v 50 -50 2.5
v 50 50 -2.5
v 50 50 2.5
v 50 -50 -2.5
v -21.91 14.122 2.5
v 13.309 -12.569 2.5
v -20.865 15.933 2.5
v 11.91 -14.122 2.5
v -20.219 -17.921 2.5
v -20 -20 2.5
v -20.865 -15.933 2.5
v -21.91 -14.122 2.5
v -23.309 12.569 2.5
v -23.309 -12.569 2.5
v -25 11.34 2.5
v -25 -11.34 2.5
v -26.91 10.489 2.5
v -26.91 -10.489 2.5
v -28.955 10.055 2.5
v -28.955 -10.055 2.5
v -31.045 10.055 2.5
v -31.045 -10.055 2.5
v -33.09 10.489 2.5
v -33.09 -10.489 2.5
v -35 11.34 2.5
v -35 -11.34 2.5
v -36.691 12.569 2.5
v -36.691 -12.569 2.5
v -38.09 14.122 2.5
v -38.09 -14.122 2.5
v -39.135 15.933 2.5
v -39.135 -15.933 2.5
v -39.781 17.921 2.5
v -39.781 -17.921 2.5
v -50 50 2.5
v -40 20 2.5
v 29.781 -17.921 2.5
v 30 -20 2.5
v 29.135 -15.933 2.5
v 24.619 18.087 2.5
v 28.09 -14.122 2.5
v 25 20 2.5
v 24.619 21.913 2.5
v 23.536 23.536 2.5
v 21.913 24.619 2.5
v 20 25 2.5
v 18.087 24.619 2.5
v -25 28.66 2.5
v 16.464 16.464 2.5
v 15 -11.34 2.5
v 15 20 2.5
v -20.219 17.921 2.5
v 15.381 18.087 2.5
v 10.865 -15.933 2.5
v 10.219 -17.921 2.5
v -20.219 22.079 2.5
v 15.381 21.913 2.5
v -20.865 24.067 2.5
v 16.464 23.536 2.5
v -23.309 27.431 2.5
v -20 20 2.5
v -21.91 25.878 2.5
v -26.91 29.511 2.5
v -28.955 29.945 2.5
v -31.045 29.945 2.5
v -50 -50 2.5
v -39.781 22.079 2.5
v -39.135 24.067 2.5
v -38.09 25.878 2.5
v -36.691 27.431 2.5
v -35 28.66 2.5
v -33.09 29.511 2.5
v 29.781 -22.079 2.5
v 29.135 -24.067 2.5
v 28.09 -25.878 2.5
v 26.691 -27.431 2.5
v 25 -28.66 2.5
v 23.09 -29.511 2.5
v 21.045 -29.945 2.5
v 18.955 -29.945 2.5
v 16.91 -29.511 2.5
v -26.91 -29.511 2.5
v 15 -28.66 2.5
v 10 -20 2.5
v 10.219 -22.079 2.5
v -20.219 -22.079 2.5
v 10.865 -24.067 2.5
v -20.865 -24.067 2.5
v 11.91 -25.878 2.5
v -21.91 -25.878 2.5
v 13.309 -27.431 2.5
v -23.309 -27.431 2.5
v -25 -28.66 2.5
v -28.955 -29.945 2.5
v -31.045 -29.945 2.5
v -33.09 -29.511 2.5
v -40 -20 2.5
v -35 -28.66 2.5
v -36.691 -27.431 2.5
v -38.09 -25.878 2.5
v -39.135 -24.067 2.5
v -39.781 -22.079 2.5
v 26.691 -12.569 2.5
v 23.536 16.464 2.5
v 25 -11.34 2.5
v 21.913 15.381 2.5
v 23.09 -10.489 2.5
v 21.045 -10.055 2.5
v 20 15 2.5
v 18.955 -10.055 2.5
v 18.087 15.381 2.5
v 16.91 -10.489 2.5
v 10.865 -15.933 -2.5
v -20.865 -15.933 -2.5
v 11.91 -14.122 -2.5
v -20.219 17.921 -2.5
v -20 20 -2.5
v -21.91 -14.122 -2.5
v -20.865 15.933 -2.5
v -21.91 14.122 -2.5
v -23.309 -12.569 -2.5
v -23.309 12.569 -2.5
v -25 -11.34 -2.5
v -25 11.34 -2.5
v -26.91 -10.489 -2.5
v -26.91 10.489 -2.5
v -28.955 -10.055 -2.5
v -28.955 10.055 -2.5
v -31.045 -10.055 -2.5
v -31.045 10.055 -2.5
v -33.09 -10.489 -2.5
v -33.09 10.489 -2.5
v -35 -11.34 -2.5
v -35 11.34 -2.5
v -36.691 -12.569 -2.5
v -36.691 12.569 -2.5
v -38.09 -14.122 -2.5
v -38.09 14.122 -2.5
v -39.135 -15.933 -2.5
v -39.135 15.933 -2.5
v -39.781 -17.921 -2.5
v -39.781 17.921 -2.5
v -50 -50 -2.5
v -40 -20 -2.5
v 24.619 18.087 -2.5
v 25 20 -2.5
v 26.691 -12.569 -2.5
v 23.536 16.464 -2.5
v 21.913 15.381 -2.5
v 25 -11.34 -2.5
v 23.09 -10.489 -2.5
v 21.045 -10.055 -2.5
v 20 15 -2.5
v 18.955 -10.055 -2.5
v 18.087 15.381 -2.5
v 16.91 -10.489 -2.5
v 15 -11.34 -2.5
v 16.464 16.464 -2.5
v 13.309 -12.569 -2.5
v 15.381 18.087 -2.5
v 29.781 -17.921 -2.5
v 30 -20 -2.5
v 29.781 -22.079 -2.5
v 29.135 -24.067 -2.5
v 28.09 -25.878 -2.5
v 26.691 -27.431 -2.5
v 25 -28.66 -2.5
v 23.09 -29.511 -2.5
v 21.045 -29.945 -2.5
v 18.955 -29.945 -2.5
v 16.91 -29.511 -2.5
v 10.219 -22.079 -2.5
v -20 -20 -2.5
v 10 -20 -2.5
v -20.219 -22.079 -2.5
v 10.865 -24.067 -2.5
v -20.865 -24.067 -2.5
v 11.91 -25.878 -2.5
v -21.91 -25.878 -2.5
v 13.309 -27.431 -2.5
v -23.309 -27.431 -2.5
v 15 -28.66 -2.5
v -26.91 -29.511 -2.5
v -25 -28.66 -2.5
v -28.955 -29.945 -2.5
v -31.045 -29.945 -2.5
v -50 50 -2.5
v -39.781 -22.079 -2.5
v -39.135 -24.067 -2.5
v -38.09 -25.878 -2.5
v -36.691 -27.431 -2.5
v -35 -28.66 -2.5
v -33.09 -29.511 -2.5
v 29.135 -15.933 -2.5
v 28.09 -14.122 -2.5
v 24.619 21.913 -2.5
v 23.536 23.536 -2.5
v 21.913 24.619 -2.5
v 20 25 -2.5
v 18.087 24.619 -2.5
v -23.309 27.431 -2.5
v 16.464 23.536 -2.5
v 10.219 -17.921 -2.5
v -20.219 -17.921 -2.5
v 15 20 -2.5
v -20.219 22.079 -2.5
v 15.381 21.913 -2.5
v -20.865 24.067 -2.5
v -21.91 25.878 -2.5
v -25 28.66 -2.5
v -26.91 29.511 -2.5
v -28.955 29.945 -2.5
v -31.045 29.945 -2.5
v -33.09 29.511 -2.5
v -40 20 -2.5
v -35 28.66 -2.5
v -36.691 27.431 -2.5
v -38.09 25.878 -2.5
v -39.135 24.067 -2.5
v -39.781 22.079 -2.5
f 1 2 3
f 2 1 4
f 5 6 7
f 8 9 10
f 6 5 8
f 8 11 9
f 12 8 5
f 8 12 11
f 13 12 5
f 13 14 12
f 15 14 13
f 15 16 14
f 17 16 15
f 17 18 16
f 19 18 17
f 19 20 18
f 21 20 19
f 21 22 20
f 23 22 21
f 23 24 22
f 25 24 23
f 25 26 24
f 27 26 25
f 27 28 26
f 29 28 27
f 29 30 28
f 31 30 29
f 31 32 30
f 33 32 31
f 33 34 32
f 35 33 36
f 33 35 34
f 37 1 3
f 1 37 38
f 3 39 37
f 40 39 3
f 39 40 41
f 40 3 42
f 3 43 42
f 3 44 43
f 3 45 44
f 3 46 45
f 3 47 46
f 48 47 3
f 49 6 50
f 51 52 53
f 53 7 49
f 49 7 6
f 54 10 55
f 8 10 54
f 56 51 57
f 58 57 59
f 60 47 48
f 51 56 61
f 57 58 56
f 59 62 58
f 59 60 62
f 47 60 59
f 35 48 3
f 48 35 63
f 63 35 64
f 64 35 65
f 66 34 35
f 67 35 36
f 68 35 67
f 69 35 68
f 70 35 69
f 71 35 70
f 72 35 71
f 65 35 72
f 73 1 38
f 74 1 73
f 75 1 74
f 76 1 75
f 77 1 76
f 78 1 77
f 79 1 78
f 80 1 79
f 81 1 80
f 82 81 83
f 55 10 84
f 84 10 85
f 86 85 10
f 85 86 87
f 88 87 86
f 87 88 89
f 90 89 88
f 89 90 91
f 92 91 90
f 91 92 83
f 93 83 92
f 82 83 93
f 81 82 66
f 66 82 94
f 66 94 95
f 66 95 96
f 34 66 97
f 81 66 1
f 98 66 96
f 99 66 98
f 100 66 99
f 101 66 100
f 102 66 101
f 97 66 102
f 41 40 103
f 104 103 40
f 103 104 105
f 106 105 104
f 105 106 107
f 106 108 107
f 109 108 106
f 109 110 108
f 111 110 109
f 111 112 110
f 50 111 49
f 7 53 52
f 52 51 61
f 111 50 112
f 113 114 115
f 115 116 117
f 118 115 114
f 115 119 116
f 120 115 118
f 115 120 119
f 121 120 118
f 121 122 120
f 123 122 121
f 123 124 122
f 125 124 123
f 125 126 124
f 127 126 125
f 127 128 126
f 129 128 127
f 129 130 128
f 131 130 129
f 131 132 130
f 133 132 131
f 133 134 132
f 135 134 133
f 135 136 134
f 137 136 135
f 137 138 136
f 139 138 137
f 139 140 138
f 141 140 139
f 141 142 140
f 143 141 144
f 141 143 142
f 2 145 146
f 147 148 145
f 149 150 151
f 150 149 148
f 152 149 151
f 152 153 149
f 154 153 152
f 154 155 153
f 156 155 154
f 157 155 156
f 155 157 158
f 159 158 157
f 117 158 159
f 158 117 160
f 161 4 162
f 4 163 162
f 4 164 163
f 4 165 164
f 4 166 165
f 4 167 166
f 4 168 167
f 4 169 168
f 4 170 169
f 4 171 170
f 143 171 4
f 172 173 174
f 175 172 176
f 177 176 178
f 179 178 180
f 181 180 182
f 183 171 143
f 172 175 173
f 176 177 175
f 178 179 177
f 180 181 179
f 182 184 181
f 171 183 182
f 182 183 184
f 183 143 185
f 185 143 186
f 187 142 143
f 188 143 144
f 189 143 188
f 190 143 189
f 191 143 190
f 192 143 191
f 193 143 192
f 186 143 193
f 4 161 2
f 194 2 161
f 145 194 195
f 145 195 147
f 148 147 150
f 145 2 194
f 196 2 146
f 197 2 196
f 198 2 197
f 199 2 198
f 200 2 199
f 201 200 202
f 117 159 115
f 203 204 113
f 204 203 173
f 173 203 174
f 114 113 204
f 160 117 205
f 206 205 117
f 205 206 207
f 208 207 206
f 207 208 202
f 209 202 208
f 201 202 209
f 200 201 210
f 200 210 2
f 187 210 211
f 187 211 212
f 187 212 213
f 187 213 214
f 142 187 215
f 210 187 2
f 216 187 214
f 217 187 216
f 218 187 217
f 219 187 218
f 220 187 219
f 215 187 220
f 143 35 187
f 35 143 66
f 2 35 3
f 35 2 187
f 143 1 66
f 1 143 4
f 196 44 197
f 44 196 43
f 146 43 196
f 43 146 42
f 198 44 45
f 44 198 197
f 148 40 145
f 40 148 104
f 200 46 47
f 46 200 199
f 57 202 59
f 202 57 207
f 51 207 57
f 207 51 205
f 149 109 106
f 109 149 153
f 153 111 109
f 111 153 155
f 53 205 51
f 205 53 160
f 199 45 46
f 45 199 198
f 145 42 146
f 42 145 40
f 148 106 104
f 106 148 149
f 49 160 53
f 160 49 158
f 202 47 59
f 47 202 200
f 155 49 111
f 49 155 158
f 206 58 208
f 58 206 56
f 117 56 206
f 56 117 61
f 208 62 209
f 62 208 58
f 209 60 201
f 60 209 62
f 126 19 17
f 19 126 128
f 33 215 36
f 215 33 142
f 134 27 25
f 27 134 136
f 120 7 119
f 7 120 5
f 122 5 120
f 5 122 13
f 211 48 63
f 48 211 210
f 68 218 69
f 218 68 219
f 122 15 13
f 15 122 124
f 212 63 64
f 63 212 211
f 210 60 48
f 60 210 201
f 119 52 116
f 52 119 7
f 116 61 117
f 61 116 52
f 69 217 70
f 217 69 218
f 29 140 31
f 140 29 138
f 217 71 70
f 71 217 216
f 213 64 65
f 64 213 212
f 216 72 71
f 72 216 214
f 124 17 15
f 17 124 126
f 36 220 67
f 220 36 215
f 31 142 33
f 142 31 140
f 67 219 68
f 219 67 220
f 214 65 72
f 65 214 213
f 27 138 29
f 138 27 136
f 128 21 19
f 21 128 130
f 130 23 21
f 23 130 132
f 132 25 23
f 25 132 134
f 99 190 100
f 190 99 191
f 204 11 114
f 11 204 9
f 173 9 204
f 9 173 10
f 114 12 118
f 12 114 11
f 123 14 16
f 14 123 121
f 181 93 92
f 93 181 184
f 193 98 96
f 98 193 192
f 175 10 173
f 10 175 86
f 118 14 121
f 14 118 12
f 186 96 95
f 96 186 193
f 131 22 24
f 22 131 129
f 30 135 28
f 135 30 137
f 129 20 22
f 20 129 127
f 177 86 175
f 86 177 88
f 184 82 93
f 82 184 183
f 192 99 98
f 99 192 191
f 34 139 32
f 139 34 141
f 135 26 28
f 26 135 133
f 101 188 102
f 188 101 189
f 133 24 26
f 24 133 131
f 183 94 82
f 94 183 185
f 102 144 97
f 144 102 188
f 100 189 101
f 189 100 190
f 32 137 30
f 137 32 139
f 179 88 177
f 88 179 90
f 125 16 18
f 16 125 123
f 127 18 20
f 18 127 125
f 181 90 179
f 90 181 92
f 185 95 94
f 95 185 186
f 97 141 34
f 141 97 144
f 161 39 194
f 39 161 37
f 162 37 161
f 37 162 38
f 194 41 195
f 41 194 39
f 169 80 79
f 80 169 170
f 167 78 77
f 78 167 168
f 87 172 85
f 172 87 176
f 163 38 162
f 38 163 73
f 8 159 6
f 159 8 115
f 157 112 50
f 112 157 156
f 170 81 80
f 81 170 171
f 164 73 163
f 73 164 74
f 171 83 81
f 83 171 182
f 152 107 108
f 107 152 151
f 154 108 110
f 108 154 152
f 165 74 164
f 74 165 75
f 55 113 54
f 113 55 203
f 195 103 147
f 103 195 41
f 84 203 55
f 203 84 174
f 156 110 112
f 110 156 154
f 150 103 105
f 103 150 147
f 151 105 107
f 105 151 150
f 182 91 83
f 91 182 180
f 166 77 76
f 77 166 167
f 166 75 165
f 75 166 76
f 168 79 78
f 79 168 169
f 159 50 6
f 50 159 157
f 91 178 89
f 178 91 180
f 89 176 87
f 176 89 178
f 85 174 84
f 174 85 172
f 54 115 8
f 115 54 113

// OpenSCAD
module Hole_Plate(){

    // Plate
    Plate_Thickness = 5;
    Plate_Width = 100;
    Plate_Height = 100;

    interasse = 50;
    interasse_2 = 80;
    first_hole = [20,20,-2];
    Hole_Diameter = 5;

    translate([first_hole[0] - interasse,-20,-2]){
    %cube([40,1,1]);
    }

    difference(){
        color("#a8b0b2"){
        cube([100,100,Plate_Thickness], center = true);
        }

        translate(first_hole){
        cylinder(12,Hole_Diameter,Hole_Diameter, center = true);
        }

        translate([first_hole[0] - interasse,20,-2]){
        cylinder(12,10,10, center = true);
        }

        translate([first_hole[0] - interasse,-20,-2]){
        cylinder(12,10,10, center = true);
        }

        translate([20,-20,-2]){
        cylinder(12,10,10, center = true);
        }
    }

}

Hole_Plate();


// Written by Nicolì Angelo (Gengio) 2024: 
// MIT License

//Permission is hereby granted, free of charge, to any person obtaining a copy of this software and associated documentation files (the "Software"), to deal in the Software without restriction, including without limitation the rights to use, copy, modify, merge, publish, distribute, sublicense, and/or sell copies of the Software, and to permit persons to whom the Software is furnished to do so, subject to the following conditions:

//The above copyright notice and this permission notice shall be included in all copies or substantial portions of the Software.

//THE SOFTWARE IS PROVIDED "AS IS", WITHOUT WARRANTY OF ANY KIND, EXPRESS OR IMPLIED, INCLUDING BUT NOT LIMITED TO THE WARRANTIES OF MERCHANTABILITY, FITNESS FOR A PARTICULAR PURPOSE AND NONINFRINGEMENT. IN NO EVENT SHALL THE AUTHORS OR COPYRIGHT HOLDERS BE LIABLE FOR ANY CLAIM, DAMAGES OR OTHER LIABILITY, WHETHER IN AN ACTION OF CONTRACT, TORT OR OTHERWISE, ARISING FROM, OUT OF OR IN CONNECTION WITH THE SOFTWARE OR THE USE OR OTHER DEALINGS IN THE SOFTWARE.
